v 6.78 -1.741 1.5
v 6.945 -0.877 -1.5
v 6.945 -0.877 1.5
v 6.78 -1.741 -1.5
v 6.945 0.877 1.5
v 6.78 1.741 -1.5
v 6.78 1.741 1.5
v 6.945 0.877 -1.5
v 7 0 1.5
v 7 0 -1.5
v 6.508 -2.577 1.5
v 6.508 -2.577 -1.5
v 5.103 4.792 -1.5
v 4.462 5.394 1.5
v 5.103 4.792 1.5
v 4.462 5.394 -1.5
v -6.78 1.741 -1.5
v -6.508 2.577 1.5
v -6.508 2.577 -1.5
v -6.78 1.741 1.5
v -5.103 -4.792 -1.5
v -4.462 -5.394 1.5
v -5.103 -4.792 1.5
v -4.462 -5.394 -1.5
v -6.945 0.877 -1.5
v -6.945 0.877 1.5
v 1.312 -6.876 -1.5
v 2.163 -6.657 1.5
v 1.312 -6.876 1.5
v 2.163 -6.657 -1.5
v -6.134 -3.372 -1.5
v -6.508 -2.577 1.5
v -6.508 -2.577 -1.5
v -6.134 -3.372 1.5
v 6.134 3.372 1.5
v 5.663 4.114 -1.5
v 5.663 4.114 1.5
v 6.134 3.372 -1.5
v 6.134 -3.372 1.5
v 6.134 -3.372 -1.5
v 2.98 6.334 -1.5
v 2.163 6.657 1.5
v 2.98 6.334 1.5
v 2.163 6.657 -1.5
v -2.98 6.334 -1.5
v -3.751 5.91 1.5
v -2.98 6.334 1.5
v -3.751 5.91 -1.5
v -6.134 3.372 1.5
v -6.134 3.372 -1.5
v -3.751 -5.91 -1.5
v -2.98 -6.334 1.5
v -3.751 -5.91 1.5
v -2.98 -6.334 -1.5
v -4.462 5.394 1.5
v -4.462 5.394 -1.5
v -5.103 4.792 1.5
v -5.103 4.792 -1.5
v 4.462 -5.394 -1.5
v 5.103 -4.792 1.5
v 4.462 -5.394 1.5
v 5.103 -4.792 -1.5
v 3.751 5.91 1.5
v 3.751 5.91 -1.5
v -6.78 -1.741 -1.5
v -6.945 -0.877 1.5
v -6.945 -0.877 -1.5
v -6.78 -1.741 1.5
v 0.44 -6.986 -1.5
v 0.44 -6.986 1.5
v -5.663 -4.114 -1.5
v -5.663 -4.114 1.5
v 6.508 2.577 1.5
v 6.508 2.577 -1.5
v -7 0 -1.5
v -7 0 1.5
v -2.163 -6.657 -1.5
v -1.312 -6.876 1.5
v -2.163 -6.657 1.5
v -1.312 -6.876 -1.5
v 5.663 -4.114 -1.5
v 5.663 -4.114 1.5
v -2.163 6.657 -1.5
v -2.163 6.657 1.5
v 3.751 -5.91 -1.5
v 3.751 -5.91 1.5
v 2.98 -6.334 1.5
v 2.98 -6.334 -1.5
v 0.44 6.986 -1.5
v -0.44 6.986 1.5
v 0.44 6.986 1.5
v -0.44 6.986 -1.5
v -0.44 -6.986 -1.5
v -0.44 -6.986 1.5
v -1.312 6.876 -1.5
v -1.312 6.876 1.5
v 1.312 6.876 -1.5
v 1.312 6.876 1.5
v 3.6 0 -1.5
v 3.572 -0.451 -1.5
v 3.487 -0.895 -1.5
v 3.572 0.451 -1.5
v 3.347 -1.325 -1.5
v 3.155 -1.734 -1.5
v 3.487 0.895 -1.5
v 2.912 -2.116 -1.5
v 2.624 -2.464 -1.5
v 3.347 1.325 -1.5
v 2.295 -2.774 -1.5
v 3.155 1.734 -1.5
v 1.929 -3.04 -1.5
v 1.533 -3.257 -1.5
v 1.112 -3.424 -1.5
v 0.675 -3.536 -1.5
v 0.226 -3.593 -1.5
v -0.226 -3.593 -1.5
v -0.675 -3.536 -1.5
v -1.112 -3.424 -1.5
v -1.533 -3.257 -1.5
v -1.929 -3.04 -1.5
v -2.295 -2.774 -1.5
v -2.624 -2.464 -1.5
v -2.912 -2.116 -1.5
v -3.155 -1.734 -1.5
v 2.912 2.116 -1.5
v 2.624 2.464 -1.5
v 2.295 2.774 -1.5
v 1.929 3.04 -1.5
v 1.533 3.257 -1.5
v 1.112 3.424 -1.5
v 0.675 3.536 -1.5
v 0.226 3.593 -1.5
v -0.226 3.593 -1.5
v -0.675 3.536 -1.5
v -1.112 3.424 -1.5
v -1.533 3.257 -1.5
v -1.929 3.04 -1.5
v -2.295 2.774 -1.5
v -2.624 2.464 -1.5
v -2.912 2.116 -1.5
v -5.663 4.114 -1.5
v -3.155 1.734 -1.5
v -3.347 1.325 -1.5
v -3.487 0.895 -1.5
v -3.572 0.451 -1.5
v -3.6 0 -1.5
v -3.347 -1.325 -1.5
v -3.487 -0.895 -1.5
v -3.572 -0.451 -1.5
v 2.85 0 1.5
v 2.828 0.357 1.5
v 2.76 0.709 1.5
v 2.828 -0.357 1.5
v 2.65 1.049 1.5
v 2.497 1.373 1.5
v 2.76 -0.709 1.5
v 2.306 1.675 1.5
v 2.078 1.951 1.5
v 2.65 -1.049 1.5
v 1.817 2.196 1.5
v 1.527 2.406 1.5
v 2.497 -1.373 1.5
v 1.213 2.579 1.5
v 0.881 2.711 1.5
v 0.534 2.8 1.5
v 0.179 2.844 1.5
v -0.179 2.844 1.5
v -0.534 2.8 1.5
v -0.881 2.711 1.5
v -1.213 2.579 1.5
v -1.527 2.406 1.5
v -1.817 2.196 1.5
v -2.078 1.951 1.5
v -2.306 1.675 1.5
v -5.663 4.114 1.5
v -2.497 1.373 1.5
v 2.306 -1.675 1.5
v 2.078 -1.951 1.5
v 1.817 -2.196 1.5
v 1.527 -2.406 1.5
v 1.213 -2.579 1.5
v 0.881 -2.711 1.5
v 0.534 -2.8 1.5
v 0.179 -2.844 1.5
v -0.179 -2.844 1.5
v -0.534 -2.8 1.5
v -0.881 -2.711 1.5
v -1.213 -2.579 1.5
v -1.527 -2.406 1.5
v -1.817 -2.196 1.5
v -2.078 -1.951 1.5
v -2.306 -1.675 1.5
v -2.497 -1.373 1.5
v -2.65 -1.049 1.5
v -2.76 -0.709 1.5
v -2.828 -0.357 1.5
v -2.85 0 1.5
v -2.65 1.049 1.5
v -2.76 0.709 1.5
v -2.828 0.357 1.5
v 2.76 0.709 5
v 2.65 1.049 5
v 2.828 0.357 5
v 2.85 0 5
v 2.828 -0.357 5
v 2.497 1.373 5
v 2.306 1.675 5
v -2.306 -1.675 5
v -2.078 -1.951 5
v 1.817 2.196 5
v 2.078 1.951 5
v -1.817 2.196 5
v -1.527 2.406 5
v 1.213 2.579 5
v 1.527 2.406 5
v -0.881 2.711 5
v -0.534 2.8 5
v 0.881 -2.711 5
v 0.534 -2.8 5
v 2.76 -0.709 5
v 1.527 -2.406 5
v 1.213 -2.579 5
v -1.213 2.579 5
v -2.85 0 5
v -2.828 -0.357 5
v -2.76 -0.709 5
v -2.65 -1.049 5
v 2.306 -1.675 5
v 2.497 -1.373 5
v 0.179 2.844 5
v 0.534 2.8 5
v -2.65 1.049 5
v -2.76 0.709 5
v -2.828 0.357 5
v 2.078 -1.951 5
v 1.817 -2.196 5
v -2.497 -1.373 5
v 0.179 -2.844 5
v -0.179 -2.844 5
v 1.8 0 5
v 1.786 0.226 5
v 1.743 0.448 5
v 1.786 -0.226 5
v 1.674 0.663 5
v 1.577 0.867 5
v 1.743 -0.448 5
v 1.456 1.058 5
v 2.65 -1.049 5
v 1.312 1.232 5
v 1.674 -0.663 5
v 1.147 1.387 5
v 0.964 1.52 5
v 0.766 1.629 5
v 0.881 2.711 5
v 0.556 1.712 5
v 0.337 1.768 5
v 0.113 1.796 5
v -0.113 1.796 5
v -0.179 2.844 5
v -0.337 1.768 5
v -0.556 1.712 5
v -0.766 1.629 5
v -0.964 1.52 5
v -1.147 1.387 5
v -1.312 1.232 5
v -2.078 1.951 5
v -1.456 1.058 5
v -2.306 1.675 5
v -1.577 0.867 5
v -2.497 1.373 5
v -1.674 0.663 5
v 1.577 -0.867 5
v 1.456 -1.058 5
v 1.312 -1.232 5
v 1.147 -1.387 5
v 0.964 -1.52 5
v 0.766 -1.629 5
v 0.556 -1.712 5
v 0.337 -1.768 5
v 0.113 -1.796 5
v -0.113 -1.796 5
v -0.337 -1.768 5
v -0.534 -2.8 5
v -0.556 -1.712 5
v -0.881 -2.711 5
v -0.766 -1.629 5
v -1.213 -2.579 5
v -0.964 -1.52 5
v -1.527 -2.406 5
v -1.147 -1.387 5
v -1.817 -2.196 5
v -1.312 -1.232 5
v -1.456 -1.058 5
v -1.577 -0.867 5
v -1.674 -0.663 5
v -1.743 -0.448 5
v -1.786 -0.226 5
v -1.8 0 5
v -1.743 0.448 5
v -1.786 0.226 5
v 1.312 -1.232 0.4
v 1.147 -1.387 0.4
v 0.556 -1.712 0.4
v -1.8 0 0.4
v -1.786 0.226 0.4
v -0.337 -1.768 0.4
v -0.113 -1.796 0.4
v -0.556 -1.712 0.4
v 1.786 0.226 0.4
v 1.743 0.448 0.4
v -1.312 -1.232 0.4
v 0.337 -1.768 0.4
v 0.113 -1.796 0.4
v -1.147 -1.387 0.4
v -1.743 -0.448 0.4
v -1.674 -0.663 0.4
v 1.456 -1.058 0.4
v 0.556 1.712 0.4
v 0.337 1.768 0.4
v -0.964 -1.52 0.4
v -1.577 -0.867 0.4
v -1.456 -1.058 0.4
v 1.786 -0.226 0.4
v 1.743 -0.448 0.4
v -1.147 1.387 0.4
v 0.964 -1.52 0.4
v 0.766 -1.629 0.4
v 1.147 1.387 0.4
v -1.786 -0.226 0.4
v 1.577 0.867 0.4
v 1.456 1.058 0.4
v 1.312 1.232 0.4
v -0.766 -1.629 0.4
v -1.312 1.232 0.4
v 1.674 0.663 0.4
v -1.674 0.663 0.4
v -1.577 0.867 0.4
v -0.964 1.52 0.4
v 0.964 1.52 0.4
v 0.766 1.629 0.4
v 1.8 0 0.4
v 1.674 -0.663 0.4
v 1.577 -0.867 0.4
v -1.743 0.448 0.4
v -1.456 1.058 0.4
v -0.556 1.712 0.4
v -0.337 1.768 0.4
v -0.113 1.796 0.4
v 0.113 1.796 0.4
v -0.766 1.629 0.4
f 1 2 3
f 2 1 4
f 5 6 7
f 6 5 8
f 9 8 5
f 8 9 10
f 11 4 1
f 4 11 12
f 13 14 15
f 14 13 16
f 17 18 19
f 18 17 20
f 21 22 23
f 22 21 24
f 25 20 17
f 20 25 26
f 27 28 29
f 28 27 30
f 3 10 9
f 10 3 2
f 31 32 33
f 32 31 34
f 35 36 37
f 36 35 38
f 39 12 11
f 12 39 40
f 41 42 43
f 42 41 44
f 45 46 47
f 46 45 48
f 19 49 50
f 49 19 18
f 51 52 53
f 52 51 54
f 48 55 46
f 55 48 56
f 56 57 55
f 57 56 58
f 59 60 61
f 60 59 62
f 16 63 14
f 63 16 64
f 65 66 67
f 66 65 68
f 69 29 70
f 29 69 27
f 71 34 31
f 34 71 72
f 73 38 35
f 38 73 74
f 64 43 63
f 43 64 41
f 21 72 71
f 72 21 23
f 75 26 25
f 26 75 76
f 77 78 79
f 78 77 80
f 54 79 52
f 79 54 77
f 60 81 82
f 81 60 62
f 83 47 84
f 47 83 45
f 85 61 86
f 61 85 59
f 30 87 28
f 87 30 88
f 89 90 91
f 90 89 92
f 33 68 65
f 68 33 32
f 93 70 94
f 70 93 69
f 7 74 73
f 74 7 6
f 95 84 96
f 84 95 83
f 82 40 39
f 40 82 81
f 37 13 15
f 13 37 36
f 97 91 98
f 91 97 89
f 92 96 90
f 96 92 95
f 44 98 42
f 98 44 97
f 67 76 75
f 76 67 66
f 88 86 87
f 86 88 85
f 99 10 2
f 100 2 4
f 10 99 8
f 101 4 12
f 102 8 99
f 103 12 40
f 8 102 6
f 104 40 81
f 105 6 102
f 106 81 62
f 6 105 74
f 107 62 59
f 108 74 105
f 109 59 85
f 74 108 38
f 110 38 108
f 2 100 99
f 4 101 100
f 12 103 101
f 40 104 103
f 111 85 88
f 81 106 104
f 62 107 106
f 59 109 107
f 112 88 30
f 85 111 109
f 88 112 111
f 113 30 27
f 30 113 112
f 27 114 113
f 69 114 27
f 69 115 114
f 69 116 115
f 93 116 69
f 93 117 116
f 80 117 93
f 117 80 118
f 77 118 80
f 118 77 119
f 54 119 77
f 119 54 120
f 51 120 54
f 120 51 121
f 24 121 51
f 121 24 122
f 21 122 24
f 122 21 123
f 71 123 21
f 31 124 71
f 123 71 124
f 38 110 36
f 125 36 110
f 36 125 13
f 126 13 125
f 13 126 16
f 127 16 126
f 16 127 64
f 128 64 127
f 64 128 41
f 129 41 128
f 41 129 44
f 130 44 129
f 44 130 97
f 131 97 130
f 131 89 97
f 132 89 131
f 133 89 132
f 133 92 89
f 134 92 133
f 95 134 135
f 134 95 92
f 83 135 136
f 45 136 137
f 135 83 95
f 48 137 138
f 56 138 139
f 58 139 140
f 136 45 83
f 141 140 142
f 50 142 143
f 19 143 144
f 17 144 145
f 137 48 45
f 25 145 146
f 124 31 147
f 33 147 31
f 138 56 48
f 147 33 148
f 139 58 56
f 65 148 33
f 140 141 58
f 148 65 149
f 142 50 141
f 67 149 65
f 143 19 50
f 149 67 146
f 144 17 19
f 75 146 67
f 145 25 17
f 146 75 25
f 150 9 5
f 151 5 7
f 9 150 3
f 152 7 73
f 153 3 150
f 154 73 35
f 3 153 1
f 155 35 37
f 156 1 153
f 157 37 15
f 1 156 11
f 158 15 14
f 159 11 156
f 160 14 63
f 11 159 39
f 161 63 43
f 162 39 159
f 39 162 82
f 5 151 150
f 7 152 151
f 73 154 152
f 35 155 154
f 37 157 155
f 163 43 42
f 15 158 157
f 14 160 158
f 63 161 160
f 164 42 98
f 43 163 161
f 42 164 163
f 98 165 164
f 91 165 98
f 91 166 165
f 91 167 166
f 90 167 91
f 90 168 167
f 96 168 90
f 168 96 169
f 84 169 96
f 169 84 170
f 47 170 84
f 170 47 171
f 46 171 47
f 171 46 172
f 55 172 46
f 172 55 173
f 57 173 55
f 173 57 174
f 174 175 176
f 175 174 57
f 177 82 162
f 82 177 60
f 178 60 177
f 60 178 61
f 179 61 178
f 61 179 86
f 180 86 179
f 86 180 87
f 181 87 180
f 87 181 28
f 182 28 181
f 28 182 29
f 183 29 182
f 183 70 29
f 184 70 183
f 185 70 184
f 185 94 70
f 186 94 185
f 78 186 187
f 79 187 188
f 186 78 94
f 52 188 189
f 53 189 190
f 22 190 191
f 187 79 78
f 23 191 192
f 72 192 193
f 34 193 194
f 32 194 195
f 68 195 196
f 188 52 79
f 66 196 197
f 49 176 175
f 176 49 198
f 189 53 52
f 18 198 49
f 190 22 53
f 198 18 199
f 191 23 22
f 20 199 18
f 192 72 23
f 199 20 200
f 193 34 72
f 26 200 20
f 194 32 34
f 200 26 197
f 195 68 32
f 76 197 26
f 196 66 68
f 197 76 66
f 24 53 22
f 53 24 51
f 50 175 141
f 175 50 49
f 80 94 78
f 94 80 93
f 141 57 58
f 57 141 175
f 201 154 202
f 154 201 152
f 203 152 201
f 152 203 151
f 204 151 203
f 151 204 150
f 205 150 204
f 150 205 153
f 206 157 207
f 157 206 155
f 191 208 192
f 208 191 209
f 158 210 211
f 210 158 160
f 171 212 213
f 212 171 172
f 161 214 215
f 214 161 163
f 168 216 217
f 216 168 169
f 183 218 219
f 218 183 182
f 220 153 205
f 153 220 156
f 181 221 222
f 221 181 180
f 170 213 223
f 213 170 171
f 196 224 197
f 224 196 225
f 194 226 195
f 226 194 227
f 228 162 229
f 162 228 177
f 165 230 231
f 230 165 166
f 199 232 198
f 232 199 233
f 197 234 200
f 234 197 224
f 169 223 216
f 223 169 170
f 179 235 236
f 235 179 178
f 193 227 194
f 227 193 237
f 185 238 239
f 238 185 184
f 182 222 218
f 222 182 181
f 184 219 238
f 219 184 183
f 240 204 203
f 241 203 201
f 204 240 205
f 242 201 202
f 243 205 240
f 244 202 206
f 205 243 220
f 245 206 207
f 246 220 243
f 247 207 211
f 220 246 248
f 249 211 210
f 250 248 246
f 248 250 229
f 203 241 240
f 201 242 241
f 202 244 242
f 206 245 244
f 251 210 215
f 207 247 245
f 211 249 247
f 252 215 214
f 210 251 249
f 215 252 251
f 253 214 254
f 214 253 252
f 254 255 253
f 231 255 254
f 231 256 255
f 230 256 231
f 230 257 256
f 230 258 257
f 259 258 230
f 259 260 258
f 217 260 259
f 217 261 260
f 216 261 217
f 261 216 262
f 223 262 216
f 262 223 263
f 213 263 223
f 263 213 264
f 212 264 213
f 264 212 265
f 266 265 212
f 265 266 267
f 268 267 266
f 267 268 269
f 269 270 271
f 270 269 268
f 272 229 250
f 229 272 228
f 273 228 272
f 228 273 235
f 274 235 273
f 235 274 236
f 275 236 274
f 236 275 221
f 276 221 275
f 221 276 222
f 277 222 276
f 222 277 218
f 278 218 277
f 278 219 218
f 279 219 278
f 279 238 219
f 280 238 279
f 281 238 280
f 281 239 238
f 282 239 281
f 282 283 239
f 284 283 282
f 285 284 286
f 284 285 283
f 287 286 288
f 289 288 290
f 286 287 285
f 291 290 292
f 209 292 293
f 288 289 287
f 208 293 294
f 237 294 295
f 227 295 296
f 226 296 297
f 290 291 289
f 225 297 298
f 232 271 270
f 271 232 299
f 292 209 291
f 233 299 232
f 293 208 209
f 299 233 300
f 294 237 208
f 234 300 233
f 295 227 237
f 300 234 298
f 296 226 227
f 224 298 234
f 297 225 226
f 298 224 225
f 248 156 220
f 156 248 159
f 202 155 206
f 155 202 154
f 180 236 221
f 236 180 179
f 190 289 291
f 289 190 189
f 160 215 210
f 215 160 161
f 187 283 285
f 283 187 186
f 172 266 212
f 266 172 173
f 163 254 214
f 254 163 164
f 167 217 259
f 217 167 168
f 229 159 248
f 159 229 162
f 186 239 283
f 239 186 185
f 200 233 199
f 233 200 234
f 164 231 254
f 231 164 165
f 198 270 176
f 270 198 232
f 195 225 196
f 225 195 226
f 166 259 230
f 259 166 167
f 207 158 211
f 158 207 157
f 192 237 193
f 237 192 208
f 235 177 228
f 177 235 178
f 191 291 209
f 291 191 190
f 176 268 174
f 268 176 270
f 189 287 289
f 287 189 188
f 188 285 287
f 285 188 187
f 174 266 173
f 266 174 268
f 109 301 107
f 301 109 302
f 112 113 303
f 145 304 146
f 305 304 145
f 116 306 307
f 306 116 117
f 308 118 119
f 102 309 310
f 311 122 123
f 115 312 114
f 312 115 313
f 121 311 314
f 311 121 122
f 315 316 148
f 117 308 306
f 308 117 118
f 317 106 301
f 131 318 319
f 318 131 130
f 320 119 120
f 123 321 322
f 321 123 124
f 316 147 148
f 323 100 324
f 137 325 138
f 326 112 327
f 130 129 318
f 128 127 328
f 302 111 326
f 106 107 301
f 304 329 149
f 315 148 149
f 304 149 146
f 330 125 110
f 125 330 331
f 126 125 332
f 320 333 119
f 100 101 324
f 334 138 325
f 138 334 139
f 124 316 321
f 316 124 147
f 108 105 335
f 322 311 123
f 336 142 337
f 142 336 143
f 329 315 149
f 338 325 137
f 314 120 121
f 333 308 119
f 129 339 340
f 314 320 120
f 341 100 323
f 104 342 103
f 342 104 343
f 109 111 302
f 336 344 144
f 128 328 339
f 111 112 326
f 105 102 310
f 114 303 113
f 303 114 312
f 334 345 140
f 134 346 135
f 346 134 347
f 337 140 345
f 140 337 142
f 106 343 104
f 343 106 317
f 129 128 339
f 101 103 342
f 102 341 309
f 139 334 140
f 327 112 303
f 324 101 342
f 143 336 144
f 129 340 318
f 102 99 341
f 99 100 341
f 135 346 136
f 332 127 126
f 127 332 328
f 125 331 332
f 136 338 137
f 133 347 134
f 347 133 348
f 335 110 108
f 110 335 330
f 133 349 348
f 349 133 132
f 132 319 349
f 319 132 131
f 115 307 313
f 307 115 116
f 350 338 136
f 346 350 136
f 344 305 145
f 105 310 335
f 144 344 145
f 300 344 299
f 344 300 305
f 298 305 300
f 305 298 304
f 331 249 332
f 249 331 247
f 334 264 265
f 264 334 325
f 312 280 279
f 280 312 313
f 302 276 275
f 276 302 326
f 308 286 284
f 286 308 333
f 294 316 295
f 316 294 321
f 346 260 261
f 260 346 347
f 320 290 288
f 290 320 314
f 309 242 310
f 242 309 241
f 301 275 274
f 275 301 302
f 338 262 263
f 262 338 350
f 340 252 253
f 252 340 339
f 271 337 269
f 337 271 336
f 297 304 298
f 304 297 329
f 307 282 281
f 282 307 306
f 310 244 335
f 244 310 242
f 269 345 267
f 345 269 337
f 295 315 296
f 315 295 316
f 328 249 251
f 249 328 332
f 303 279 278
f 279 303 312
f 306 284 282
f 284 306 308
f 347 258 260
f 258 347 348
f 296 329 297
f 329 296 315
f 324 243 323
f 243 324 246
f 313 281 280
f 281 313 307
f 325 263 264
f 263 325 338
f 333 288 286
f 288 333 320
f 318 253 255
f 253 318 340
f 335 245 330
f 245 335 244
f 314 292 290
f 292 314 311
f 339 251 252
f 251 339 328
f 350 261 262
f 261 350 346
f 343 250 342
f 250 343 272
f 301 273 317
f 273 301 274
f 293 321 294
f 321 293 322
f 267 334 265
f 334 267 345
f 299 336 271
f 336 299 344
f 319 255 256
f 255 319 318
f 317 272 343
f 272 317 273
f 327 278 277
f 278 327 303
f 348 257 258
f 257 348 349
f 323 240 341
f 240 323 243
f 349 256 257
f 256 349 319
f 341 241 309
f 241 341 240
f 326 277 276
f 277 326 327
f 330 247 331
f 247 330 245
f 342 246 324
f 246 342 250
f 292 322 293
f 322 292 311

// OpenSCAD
$fn = 50;


difference() {
	union() {
		translate(v = [0, 0, -1.5000000000]) {
			cylinder(h = 3, r = 7.0000000000);
		}
		translate(v = [0, 0, -1.5000000000]) {
			cylinder(h = 6.5000000000, r = 2.8500000000);
		}
	}
	union() {
		translate(v = [0, 0, -1.5000000000]) {
			rotate(a = [0, 180, 0]) {
				difference() {
					union() {
						translate(v = [0, 0, -6.5000000000]) {
							cylinder(h = 6.5000000000, r = 1.5000000000);
						}
						translate(v = [0, 0, -1.9000000000]) {
							cylinder(h = 1.9000000000, r1 = 1.8000000000, r2 = 3.6000000000);
						}
						translate(v = [0, 0, -6.5000000000]) {
							cylinder(h = 6.5000000000, r = 1.8000000000);
						}
						translate(v = [0, 0, -6.5000000000]) {
							cylinder(h = 6.5000000000, r = 1.5000000000);
						}
					}
					union();
				}
			}
		}
		translate(v = [0, 0, -50.0000000000]) {
			cylinder(h = 100, r = 1.8000000000);
		}
	}
}
